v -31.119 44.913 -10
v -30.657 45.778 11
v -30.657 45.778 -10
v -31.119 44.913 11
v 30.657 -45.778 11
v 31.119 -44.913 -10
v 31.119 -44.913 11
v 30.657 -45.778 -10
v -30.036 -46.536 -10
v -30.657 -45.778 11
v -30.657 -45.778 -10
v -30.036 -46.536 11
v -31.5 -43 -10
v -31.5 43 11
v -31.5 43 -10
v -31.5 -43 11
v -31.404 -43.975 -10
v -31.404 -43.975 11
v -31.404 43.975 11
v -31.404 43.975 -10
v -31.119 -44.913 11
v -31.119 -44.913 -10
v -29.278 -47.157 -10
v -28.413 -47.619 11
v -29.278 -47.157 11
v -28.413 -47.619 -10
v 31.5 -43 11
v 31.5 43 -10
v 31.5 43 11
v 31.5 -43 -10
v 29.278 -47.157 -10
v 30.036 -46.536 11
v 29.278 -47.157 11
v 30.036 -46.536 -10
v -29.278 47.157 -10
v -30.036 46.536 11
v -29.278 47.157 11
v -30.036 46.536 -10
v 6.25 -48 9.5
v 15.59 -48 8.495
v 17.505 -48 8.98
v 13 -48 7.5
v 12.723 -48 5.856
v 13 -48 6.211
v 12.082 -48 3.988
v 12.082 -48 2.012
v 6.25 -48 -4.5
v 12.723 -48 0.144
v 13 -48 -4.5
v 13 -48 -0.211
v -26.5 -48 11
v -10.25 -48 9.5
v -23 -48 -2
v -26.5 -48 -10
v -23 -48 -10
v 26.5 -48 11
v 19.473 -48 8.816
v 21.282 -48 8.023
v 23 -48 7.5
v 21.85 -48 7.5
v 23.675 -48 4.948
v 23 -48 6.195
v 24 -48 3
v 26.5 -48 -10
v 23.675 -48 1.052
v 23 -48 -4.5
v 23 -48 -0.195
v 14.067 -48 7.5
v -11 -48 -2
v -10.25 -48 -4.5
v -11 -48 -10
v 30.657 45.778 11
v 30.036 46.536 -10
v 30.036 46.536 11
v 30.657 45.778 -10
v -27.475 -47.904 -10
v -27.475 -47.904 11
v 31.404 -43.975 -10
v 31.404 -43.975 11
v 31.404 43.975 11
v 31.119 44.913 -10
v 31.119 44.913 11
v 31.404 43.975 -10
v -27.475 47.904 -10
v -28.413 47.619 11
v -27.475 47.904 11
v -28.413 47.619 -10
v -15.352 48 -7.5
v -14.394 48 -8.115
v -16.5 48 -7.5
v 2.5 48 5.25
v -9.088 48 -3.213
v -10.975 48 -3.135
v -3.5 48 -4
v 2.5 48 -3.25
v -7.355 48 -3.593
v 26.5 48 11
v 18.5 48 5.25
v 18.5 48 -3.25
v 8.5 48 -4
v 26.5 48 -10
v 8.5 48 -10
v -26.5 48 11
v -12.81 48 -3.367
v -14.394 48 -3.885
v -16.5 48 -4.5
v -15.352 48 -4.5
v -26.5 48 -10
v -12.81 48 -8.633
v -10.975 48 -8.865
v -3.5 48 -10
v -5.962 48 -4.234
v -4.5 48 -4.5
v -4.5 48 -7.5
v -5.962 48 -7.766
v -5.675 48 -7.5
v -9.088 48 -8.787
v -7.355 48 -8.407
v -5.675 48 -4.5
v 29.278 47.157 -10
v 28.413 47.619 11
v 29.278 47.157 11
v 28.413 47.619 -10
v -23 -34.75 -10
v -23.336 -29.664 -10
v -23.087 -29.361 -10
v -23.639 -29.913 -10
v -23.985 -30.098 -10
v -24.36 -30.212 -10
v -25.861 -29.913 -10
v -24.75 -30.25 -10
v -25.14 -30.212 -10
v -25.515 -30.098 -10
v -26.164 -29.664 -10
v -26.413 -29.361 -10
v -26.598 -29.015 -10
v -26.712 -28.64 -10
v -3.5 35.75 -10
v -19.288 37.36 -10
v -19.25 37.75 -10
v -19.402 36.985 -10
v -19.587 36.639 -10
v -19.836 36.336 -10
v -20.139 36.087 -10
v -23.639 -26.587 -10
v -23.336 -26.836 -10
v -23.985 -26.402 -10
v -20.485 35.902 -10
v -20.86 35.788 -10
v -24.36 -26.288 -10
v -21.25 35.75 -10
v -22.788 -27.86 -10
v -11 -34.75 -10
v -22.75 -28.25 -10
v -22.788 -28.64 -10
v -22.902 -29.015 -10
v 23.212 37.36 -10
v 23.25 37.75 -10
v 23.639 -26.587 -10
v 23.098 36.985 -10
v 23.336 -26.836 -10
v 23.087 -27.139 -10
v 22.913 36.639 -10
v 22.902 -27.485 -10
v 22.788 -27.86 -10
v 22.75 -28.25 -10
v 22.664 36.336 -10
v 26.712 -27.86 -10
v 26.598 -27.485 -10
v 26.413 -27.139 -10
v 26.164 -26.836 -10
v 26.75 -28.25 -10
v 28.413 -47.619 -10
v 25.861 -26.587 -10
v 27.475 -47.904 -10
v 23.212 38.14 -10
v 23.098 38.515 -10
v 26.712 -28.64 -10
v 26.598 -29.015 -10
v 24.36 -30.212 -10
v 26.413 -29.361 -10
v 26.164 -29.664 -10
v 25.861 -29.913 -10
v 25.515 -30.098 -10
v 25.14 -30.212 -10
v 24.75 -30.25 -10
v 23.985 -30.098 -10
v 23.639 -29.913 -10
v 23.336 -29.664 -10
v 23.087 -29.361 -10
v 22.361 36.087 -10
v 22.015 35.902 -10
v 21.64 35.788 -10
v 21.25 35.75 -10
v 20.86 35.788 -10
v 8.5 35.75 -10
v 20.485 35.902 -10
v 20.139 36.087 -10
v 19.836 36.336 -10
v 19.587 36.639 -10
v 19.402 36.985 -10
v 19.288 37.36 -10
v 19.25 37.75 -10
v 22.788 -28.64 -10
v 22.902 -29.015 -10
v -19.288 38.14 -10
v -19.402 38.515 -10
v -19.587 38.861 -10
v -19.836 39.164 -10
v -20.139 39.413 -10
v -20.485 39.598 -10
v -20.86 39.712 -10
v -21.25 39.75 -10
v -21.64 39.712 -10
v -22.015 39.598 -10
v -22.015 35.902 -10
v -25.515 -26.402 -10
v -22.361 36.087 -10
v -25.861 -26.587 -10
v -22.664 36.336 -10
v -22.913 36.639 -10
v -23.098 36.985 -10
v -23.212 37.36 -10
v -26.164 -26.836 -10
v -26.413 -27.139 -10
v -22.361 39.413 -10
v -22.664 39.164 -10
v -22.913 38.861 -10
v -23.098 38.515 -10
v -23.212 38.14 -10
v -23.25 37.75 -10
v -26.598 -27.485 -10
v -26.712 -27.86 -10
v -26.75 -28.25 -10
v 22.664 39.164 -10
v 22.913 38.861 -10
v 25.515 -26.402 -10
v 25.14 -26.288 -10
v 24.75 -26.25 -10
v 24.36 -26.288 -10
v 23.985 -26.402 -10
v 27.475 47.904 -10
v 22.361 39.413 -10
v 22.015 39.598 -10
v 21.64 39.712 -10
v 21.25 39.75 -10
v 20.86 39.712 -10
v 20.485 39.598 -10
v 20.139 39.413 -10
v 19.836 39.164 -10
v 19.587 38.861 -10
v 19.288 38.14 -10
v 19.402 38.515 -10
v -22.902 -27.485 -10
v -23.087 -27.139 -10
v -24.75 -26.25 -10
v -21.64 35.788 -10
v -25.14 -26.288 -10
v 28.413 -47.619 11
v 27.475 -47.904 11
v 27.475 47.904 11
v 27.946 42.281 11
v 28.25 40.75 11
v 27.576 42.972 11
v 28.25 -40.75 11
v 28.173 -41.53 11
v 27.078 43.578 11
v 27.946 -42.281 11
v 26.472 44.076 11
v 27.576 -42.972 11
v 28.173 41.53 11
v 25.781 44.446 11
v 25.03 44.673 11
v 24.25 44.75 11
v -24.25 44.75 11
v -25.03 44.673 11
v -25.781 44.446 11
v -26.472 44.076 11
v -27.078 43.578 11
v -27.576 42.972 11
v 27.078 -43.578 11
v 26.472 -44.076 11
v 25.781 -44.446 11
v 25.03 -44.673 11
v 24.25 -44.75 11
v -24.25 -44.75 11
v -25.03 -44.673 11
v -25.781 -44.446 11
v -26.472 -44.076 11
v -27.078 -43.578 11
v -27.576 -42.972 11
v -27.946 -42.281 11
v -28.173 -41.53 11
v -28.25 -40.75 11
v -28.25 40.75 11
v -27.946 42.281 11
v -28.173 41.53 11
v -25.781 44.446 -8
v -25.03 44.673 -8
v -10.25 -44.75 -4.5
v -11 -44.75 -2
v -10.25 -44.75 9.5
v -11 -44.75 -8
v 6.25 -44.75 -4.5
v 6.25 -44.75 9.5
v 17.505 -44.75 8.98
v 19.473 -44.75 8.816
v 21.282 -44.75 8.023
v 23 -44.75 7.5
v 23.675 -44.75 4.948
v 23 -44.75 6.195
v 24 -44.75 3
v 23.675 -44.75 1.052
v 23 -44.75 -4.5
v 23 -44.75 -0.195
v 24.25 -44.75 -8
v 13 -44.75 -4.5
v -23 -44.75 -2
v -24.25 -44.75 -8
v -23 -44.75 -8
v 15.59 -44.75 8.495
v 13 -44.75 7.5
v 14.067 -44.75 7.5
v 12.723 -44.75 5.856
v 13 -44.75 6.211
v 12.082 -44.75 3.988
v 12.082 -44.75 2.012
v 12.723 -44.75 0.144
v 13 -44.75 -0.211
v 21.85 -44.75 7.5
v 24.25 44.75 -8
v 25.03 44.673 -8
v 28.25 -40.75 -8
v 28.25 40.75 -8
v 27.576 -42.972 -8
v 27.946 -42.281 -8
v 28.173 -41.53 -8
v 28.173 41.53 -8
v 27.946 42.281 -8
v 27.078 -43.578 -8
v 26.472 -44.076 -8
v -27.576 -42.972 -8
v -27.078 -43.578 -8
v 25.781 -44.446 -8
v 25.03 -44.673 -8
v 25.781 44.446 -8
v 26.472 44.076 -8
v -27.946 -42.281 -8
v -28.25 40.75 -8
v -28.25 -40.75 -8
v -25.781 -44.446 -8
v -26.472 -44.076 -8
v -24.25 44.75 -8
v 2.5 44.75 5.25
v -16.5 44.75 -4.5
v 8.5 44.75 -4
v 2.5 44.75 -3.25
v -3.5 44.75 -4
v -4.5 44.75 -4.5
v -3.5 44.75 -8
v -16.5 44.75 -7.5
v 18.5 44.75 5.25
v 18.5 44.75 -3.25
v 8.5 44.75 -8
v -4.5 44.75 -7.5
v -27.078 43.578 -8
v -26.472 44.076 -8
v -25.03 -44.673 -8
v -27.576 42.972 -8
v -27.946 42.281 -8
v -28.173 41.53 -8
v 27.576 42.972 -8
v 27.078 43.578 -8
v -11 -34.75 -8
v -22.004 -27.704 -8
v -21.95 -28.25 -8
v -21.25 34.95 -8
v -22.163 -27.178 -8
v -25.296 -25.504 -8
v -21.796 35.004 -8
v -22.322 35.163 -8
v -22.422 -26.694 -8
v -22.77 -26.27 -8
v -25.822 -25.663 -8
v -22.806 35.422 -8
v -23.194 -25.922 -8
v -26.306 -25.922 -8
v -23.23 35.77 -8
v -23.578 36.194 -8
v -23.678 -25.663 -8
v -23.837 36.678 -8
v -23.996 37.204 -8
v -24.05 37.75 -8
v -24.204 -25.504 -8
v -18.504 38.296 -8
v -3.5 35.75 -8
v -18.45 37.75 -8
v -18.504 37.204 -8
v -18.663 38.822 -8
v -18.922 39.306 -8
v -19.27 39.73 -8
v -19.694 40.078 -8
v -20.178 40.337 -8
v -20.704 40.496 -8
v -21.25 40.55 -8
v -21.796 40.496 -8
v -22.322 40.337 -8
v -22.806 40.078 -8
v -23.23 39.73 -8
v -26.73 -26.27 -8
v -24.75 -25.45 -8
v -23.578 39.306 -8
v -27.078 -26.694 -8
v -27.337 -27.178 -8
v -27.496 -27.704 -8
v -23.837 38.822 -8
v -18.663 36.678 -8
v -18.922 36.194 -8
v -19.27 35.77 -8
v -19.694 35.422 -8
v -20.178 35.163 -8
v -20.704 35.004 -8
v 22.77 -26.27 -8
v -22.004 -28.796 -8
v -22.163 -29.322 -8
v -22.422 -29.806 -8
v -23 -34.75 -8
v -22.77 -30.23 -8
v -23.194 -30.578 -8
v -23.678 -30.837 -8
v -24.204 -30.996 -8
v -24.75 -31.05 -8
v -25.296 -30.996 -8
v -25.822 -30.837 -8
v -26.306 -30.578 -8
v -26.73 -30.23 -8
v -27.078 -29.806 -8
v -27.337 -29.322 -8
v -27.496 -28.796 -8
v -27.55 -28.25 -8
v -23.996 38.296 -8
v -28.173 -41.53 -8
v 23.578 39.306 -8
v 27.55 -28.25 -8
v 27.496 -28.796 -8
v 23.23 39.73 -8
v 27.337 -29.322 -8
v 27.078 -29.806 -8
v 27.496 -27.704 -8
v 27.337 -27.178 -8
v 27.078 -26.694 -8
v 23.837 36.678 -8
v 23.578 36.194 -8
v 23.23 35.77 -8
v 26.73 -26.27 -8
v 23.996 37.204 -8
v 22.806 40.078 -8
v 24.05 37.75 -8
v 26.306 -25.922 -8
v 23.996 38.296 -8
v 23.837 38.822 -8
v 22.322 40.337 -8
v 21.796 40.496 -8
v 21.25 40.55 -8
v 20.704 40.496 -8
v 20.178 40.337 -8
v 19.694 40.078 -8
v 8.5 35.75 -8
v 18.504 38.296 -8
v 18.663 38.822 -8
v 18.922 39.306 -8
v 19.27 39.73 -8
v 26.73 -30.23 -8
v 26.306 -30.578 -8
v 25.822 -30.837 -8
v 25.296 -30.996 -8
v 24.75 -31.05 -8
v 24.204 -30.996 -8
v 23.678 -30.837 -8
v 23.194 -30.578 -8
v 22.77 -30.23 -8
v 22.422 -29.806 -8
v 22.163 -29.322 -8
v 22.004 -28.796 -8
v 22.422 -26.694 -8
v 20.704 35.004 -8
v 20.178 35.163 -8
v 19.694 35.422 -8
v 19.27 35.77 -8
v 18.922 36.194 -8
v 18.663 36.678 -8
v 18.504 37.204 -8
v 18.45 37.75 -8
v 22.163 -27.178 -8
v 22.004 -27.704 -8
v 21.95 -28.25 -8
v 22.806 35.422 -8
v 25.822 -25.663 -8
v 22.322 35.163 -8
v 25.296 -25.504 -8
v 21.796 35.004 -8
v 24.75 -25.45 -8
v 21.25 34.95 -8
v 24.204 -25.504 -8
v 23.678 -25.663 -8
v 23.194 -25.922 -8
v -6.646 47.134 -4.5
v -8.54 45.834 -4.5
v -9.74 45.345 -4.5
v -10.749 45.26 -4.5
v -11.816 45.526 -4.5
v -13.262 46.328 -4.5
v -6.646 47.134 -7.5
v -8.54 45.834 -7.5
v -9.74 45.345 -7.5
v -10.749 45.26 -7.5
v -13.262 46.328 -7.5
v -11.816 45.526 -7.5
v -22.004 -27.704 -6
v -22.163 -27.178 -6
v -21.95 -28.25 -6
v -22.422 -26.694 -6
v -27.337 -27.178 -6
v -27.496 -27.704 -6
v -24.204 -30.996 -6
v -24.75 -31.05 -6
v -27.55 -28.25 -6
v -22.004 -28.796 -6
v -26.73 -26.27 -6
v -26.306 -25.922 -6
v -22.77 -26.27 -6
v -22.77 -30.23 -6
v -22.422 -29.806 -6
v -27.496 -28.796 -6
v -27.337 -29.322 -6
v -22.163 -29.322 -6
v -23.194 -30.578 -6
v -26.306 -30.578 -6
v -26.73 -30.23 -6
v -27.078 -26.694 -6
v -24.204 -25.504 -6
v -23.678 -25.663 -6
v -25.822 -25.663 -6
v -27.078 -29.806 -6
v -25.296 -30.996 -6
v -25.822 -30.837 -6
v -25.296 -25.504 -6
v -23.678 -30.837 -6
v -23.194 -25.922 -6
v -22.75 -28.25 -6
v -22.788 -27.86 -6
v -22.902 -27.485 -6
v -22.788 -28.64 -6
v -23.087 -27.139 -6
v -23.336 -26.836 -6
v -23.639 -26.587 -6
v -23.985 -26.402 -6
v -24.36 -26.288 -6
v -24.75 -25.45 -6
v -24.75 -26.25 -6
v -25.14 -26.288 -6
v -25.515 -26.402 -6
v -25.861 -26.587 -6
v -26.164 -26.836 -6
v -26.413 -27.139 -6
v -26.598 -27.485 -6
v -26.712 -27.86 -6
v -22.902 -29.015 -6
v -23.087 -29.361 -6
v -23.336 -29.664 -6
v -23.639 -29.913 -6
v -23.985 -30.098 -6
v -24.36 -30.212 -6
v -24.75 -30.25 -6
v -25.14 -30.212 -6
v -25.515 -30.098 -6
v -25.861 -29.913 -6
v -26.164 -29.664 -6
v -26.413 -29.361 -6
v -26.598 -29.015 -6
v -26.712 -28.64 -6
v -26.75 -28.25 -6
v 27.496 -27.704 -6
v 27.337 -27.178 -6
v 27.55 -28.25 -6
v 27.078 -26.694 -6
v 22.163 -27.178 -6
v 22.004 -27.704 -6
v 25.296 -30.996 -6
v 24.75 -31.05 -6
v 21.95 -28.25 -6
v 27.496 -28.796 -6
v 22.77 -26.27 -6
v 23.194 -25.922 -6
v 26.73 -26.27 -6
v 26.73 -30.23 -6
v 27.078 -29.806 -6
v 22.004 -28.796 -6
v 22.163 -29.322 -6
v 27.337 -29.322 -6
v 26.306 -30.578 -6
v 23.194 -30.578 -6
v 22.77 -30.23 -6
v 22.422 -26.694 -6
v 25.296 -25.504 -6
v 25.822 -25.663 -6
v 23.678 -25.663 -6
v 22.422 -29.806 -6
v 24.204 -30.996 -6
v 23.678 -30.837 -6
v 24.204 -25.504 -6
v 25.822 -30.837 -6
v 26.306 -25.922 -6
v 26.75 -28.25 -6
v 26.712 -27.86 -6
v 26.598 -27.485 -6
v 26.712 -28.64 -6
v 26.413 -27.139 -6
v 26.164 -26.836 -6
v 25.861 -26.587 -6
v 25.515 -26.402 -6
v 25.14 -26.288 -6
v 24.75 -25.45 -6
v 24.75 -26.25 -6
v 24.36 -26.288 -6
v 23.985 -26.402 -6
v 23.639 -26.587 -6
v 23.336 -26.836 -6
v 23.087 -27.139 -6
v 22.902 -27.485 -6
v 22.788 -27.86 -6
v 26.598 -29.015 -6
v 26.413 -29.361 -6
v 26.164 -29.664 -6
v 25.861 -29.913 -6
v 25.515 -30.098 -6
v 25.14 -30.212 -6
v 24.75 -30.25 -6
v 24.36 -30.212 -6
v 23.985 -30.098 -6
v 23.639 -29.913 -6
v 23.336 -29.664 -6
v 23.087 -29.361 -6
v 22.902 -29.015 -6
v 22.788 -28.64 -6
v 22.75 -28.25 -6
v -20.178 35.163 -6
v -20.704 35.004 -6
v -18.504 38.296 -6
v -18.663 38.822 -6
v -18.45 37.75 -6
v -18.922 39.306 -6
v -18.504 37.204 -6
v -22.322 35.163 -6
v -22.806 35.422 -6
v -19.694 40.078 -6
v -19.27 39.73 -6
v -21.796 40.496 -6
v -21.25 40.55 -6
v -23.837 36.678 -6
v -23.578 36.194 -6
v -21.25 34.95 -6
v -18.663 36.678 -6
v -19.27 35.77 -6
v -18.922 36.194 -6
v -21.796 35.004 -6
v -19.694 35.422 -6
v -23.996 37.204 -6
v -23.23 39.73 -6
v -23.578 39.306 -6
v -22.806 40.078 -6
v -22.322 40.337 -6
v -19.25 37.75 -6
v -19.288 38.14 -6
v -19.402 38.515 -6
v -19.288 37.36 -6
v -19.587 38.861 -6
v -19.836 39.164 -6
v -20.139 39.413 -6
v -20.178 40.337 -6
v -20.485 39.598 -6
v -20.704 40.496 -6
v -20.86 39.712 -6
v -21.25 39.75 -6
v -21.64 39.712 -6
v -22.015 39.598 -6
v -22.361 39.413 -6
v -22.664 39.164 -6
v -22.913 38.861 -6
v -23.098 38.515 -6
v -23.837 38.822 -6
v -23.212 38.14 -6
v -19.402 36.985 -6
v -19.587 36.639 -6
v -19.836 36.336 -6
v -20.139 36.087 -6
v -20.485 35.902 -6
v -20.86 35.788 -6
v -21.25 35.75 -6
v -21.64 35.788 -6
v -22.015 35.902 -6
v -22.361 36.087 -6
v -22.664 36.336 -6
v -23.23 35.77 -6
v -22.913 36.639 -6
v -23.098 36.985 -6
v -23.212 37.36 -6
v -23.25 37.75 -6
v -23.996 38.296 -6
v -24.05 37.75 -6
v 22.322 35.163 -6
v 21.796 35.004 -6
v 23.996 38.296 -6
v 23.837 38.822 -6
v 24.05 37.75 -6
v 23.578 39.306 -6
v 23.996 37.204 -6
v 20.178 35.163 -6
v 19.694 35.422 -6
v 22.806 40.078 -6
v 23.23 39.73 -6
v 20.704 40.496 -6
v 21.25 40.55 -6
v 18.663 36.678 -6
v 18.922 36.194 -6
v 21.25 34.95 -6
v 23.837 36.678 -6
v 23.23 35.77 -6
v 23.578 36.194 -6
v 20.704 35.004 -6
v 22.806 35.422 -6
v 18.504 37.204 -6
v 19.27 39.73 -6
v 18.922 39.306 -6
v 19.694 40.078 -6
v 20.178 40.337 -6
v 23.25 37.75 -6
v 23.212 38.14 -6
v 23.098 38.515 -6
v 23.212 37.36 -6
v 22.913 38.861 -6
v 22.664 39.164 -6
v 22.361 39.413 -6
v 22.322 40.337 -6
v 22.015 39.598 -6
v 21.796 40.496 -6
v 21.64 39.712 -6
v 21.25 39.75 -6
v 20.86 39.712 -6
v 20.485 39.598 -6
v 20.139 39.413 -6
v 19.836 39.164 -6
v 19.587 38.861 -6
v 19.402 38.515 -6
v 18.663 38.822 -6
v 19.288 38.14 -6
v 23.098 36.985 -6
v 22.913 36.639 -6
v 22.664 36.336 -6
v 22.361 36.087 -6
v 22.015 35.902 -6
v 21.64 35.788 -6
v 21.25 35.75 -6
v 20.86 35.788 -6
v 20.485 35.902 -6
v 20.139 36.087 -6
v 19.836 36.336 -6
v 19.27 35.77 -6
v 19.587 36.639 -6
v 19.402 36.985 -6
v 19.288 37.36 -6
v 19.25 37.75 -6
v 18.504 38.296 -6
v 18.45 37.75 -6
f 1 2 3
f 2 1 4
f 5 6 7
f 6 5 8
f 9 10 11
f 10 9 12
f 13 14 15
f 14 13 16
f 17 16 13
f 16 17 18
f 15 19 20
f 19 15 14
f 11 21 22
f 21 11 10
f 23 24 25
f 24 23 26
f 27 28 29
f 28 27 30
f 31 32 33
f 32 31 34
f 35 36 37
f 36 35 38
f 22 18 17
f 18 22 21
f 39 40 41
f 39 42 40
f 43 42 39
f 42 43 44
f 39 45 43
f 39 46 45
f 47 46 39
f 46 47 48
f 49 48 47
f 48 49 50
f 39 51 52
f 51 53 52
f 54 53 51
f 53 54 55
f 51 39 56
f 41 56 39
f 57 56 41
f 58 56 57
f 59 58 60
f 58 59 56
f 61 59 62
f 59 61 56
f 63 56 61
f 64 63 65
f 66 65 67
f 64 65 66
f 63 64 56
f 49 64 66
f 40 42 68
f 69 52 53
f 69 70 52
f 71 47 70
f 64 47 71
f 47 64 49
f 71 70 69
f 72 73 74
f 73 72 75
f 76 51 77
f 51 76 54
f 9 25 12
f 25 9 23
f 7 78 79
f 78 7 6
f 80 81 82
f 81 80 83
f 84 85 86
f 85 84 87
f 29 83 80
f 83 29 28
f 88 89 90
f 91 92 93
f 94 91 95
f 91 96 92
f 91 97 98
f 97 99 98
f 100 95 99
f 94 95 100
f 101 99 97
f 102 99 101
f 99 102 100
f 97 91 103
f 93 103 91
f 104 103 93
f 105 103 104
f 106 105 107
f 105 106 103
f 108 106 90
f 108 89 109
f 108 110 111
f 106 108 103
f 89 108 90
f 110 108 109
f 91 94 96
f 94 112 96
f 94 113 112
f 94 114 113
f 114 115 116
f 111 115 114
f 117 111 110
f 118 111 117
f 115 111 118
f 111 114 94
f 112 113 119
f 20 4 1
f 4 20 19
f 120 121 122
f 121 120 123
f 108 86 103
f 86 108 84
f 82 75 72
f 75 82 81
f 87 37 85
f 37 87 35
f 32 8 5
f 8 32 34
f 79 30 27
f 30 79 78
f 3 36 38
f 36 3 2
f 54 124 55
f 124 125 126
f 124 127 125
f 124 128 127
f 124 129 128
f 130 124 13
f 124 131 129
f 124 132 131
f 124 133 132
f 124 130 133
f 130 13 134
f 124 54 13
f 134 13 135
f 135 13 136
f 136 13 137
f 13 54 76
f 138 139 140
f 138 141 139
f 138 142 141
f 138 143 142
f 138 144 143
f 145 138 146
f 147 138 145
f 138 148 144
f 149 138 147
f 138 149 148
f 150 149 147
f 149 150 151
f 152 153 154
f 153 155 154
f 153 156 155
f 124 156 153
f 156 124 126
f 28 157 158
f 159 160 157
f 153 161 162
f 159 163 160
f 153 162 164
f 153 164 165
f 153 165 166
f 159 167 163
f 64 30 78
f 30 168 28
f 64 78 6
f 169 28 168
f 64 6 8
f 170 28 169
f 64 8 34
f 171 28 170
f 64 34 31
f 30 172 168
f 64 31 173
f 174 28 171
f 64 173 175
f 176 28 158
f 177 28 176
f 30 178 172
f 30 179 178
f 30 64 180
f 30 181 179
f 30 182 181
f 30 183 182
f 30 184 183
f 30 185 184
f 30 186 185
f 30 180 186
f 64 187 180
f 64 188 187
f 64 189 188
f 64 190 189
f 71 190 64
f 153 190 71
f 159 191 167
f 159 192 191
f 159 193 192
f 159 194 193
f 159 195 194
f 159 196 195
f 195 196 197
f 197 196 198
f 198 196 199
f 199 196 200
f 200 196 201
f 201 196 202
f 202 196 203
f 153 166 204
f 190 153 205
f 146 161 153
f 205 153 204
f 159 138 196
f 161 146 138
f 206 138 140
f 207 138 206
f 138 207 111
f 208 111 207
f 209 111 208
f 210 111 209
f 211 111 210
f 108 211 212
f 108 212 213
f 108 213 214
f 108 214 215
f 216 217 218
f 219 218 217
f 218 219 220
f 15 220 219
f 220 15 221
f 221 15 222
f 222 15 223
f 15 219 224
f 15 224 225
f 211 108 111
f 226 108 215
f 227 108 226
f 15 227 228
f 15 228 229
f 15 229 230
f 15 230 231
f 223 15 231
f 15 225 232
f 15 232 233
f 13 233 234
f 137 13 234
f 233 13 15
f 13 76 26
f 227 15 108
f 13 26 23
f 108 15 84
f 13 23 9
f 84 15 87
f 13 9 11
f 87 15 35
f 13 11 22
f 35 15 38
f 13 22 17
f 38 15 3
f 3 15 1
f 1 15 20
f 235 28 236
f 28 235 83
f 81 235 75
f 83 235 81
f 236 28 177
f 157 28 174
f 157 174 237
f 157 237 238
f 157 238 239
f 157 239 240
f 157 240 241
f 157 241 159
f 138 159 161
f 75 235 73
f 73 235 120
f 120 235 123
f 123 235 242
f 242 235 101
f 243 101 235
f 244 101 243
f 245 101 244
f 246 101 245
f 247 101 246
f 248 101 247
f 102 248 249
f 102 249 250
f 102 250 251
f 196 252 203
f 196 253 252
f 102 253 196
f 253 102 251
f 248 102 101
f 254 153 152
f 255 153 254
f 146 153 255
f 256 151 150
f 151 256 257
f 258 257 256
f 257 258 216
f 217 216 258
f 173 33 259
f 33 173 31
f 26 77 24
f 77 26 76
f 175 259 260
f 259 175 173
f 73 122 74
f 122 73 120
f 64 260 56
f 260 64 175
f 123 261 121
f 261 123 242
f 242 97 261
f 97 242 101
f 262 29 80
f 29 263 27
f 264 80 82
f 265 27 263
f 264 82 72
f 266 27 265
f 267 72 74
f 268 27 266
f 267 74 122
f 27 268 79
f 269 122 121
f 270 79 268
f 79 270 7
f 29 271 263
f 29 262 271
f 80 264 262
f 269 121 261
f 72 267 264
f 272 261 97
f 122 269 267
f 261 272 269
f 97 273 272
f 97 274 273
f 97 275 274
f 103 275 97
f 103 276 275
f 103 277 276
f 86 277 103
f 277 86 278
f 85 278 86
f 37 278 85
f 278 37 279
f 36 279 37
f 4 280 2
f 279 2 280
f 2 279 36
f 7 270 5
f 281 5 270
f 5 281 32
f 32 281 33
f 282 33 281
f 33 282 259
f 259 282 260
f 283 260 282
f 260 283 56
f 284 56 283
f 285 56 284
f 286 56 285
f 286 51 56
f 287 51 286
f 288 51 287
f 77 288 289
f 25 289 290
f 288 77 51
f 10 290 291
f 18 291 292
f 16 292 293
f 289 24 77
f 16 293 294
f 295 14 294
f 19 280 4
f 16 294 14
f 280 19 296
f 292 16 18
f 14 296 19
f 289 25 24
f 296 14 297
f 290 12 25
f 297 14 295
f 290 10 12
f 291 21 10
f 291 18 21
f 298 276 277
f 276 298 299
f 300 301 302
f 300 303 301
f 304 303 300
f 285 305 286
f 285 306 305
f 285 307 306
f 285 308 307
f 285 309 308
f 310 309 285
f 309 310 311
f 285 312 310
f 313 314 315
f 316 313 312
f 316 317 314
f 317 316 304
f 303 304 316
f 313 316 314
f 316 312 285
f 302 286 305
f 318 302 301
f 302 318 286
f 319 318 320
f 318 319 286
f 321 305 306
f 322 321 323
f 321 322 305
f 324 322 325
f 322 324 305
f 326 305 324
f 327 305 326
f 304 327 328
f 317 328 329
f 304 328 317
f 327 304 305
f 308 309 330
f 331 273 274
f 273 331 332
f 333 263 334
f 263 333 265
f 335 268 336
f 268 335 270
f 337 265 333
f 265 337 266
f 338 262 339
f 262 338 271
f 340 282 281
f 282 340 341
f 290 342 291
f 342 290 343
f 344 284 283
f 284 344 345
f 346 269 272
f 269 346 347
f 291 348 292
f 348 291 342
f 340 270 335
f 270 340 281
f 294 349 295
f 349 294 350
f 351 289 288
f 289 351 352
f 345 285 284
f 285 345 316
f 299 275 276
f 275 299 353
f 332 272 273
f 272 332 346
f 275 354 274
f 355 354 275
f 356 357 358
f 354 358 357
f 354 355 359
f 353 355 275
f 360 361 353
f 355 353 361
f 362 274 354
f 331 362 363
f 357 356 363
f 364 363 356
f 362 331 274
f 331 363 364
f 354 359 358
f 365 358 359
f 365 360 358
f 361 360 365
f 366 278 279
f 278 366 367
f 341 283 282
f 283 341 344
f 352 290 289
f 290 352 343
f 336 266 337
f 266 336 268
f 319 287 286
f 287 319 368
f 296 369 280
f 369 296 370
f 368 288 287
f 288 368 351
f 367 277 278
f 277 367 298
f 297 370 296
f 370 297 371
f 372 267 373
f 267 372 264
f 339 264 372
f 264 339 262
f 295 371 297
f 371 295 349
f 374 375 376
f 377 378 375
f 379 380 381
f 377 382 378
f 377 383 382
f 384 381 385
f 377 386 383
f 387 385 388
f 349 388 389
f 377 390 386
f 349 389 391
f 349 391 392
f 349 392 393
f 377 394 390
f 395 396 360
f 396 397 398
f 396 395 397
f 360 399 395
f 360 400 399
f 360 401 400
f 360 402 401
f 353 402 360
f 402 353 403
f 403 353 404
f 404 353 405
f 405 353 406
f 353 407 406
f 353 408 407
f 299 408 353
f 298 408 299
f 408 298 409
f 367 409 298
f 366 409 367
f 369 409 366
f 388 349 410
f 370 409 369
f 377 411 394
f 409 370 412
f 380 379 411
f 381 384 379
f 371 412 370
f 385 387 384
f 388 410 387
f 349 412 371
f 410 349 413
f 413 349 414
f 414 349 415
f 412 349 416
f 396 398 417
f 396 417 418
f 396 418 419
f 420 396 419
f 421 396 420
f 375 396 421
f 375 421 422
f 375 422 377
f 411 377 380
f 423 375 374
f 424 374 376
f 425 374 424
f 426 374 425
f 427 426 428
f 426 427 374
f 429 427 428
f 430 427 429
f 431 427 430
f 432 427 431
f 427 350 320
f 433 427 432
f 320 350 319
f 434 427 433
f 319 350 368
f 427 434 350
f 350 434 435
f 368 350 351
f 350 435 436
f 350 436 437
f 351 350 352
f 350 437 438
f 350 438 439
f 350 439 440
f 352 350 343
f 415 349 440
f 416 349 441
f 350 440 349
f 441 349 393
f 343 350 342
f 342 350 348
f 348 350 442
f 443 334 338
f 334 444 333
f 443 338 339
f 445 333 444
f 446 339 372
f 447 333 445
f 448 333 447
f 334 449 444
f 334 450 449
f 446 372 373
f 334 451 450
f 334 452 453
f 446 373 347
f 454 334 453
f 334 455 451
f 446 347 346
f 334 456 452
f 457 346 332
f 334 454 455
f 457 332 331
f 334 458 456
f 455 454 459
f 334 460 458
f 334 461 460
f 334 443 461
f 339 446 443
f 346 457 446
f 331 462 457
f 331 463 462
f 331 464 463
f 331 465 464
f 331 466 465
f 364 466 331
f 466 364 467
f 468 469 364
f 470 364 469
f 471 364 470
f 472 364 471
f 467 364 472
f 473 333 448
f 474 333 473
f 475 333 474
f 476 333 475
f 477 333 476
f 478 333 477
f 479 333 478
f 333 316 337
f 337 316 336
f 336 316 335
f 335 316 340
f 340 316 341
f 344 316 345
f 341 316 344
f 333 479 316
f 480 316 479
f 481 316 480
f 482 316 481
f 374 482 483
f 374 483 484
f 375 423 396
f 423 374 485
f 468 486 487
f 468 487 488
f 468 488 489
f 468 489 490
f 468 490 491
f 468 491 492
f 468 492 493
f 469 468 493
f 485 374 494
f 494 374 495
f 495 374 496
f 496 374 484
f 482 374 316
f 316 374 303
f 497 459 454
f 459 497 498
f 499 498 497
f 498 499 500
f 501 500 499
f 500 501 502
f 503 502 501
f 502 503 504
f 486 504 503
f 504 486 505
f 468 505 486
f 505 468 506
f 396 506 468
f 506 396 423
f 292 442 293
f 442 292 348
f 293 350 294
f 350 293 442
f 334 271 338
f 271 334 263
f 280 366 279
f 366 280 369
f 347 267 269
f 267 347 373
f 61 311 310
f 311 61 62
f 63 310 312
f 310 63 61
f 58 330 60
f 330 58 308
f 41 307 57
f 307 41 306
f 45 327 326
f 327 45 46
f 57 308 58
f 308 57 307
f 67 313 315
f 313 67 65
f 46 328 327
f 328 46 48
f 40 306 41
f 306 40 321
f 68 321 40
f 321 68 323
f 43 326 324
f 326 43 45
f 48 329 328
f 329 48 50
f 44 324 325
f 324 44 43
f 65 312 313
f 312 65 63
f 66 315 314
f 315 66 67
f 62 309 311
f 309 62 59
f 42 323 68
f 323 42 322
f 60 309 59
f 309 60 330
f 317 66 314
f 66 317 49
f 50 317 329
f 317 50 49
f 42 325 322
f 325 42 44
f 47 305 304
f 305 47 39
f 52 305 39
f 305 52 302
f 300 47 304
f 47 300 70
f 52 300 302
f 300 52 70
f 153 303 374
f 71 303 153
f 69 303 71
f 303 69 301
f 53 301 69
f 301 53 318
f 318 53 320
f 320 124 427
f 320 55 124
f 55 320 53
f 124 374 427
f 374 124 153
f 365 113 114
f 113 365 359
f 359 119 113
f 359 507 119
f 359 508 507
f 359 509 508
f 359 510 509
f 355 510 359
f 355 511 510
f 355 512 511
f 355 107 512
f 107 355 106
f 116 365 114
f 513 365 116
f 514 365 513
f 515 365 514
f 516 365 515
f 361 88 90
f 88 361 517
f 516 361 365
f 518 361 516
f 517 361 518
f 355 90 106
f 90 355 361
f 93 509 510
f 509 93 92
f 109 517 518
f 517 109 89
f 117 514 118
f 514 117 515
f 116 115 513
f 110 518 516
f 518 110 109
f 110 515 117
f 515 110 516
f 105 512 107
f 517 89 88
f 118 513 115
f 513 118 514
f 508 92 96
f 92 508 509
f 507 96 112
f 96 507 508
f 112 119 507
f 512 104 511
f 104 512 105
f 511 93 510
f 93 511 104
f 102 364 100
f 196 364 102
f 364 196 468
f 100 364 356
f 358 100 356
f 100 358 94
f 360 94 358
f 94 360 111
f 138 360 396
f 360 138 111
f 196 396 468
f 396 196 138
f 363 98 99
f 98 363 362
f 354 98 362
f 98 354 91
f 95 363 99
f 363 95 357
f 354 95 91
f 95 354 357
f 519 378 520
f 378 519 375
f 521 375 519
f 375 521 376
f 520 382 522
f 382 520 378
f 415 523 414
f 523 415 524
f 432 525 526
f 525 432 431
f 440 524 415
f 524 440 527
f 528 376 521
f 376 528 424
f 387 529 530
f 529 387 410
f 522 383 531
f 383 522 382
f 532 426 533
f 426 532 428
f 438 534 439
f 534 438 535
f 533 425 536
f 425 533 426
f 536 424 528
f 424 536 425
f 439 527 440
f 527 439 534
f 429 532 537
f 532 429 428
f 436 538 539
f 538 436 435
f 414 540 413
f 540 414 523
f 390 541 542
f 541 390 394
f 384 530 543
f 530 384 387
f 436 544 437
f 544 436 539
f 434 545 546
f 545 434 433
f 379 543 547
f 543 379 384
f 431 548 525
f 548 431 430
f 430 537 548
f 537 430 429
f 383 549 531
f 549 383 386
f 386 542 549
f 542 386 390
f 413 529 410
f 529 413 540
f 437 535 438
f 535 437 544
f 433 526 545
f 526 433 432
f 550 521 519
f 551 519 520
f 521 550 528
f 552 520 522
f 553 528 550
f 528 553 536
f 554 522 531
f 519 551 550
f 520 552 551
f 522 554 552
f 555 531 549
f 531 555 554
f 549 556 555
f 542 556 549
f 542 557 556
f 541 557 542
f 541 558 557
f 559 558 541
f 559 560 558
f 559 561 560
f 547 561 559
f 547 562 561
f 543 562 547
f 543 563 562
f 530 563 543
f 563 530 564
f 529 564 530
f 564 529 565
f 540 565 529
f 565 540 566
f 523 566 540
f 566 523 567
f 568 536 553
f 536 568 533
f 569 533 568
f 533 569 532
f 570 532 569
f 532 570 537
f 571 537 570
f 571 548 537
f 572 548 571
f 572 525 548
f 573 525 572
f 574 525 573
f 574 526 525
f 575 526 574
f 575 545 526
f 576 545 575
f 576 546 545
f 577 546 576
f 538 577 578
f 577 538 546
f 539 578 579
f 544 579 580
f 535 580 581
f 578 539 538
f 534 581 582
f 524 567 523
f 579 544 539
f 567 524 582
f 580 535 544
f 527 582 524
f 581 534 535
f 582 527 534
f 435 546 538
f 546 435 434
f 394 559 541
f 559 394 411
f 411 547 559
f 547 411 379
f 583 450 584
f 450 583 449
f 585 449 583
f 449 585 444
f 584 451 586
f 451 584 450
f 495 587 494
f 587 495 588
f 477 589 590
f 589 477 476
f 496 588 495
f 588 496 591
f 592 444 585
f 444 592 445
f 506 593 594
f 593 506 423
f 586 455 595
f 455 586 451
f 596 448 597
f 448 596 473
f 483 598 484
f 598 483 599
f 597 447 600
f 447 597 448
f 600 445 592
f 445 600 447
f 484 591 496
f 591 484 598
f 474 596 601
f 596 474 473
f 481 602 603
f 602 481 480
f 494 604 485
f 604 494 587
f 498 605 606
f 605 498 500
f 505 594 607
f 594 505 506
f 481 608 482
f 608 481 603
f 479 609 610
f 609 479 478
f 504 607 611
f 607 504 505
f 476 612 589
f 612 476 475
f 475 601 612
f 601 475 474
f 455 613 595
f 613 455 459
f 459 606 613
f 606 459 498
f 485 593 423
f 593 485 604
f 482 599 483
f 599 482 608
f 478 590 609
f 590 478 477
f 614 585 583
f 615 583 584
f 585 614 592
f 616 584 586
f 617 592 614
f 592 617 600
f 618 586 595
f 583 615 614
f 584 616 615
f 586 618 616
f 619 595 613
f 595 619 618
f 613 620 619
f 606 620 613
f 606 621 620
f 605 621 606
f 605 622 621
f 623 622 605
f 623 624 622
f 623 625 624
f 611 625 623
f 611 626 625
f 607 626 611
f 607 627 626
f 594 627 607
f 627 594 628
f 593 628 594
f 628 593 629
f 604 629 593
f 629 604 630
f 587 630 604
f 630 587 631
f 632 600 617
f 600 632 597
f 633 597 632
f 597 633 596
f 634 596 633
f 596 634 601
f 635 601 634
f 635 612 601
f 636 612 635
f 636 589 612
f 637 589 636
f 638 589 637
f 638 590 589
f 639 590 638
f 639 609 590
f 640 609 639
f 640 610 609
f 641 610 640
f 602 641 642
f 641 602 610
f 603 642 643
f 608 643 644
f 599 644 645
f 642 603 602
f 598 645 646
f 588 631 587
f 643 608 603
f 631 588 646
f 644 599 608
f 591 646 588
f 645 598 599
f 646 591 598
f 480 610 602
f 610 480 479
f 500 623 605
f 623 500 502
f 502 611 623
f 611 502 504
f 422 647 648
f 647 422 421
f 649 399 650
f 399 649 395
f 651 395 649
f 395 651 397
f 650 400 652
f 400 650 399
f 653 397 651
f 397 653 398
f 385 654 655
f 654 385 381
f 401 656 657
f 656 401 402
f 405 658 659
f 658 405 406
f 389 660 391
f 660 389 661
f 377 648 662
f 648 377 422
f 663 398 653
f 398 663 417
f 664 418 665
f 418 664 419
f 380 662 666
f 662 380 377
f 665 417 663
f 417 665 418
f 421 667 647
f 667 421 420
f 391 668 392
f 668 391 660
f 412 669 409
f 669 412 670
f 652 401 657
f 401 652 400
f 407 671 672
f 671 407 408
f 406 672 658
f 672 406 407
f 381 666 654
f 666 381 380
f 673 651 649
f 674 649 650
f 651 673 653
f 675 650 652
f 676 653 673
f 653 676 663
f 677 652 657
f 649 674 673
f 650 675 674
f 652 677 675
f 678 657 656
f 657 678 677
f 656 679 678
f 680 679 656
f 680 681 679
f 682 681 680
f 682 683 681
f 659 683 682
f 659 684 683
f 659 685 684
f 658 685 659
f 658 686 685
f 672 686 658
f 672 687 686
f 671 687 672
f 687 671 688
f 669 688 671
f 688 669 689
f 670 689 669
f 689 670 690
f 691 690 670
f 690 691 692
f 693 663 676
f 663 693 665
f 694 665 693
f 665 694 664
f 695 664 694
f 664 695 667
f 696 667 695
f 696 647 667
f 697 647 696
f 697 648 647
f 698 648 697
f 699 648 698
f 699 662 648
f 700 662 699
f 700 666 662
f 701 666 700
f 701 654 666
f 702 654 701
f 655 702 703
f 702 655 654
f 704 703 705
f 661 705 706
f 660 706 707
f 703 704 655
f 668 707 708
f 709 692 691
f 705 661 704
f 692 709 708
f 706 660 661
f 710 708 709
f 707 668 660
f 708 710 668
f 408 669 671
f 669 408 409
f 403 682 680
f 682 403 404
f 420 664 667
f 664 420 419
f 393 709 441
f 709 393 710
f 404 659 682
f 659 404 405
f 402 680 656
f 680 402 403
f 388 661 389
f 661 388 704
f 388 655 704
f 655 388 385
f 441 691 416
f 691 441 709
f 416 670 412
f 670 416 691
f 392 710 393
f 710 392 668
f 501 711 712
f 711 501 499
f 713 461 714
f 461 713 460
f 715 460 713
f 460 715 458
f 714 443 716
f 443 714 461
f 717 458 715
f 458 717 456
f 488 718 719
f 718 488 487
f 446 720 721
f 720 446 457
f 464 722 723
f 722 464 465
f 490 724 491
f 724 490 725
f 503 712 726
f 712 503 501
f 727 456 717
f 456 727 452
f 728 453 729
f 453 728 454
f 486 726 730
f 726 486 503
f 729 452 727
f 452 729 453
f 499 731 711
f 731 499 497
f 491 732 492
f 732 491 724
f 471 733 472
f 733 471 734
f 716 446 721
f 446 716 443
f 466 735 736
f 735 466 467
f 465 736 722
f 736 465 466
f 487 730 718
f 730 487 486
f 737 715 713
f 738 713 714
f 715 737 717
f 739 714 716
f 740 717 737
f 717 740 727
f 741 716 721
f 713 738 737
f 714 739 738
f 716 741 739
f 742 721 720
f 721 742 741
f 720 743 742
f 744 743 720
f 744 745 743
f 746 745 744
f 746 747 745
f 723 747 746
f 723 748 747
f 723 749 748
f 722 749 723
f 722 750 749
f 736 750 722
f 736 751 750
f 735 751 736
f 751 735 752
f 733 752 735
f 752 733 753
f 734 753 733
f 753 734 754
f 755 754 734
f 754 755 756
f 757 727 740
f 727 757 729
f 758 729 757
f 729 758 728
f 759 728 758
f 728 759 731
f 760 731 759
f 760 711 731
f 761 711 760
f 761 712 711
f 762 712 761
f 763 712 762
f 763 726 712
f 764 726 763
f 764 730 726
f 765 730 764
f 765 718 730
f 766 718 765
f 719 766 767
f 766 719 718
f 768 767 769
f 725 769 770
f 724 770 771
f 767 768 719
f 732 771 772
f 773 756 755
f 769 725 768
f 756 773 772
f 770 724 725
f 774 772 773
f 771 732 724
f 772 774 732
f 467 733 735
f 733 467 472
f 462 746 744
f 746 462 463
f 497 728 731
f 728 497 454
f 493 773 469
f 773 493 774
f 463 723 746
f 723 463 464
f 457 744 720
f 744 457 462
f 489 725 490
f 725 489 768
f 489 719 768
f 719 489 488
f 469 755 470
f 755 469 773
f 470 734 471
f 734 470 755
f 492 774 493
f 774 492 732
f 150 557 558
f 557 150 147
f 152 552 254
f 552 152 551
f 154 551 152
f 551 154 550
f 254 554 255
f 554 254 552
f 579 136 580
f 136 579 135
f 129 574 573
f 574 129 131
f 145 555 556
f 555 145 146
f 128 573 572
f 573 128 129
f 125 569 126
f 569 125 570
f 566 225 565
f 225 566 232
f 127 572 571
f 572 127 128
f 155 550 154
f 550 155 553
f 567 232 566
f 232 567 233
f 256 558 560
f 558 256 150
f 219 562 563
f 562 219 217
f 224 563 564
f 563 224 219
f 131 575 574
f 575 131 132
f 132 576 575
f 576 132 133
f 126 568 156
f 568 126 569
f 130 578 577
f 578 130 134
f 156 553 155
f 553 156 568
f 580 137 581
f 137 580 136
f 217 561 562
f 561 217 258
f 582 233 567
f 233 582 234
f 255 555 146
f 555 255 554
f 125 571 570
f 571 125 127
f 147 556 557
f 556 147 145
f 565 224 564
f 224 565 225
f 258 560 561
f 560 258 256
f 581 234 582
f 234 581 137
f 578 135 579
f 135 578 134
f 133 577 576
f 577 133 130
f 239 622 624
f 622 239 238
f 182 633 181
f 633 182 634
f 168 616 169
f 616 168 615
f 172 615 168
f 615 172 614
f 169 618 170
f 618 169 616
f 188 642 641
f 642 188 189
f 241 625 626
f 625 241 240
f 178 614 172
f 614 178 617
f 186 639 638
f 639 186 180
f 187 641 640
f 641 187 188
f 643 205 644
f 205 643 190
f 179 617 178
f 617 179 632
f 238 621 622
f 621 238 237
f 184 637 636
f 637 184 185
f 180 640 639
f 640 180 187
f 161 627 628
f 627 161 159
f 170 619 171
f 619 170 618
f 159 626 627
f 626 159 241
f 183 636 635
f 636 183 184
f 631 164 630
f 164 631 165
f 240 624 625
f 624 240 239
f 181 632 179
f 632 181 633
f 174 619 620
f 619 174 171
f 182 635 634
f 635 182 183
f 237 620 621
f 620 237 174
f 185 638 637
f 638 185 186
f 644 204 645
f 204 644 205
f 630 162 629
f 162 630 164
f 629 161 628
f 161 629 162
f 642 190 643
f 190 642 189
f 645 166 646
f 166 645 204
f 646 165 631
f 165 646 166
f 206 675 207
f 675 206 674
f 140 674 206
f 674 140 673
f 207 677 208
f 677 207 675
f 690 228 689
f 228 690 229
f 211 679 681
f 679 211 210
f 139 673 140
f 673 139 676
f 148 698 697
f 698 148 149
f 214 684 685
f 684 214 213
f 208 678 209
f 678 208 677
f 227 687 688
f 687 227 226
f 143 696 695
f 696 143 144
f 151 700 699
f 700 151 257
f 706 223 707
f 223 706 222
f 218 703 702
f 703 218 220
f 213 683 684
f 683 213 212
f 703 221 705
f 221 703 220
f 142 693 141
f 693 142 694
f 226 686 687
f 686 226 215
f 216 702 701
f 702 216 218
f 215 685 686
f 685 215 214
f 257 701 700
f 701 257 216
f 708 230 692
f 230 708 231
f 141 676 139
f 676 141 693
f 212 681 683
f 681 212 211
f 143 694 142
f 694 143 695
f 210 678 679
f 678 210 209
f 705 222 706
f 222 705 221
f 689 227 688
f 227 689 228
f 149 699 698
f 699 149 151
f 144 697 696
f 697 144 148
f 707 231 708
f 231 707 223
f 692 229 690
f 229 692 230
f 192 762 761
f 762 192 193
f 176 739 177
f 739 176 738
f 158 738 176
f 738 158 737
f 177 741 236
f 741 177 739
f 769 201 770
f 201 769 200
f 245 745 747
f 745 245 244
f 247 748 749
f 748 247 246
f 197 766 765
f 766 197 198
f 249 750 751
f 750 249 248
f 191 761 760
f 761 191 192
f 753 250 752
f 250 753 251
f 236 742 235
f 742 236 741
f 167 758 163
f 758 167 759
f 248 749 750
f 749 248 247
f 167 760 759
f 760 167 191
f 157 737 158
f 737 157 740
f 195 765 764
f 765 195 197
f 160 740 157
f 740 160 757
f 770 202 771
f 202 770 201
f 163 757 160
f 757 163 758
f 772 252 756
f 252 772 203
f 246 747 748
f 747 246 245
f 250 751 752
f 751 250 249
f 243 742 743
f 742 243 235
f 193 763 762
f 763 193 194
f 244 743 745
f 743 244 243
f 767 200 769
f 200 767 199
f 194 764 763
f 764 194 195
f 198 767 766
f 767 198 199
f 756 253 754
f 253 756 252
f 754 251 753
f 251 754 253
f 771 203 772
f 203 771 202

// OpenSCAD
wall_thickness=6.5;
base_thickness=2.0;
bb_depth=20;
bb_width=56.5;
bb_height=89.5;
bb_curve_corner=10;

peg_pow_front=16.5;
peg_pow_side=3.5;

peg_sd_front=7;
peg_sd_side=7;

peg_outer_radius=2.8;
peg_inner_radius=2.0;

module RoundedBB(extra_width,extra_height,depth,curve=bb_curve_corner) {
  minkowski() {
		cube([bb_width-curve+extra_width,bb_height-curve+extra_height,depth],center=true);
		cylinder(r=curve/2, height=depth, $fn=32);
	}
}

module BeagleBox(curve=bb_curve_corner) {
	difference() {
		RoundedBB(wall_thickness, wall_thickness, bb_depth, curve);
		translate([0,0,base_thickness])
			RoundedBB(0, 0, bb_depth, curve-2);
	}	
}

difference() {
	union() {
		difference() {
			BeagleBox();

			translate([0,0,-bb_depth/2+9]) {
				// -- Bottom End --

				// Power connector
%				translate([18,-bb_height/2,2.5])
					cube([10,10,12],center=true);
				translate( [18,-45,4] )
					rotate( [90,0,0] )
					cylinder( r=6, h=9, center=true );
				translate([18,-bb_height/2,2.5])
					cube([10,10,12],center=true);
				// Ethernet port
				translate([-2,-bb_height/2,3.5])
					cube([16.5,10,14],center=true);

				// Mini USB (Underneath)
				// translate([-23,-bb_height/2-5,-16])     // protruding
				// translate([-23,-bb_height/2,-9+0.334])  // thin layer underneath
				//	cube([10,12,base_thickness-0.3333]);
				translate([-23,-bb_height/2-10,-10])
					cube([12,20,9]);
				// original mini USB, doesn't fit cable
%				translate([-22,-bb_height/2-10,-12])
					cube([10,20,8]);

				// -- Top End --

				// SD Card slot
				translate([-6.5-4,bb_height/2,-5.0])
					cube([12,10,3], center=true);
				// Original SD slot
%				translate([-6.5,bb_height/2,-5.5])
					cube([12,10,2], center=true);
				// thumb depression for inserting card
				translate([-6.5-4,bb_height/2+3.5,-5.0])
					scale( [1,1,0.5] )
					rotate( [90,0,0] )
					cylinder( r1=6, r2=0, h=6 );
				// HDMI port
				translate([-6.5+3.0,bb_height/2-9,-12.0])
					cube([12,20,9]);
				// USB port
				translate([10.5,bb_height/2,2.0])
					cube([16,10,8.5],center=true);
			}
		}

		// Pegs
		translate([0,0,-bb_depth/2+9]) {
			// Pegs on "power" end
			translate([-bb_width/2+peg_pow_side,-bb_height/2+peg_pow_front,-6])
				cylinder(r=peg_outer_radius,h=2,$fn=32,center=true);
			translate([bb_width/2-peg_pow_side,-bb_height/2+peg_pow_front,-6])
				cylinder(r=peg_outer_radius,h=2,$fn=32,center=true);

			// Pegs on "sd card" end
			translate([-bb_width/2+peg_sd_side,bb_height/2-peg_sd_front,-6])
				cylinder(r=peg_outer_radius,h=2,$fn=32,center=true);
			translate([bb_width/2-peg_sd_side,bb_height/2-peg_sd_front,-6])
				cylinder(r=peg_outer_radius,h=2,$fn=32,center=true);
		}
	}

	// Drill holes through pegs and floor
	translate([0,0,-bb_depth/2+9]) {
		// Pegs on "power" end
		translate([-bb_width/2+peg_pow_side,-bb_height/2+peg_pow_front,-5])
			cylinder(r=peg_inner_radius,h=10,$fn=32,center=true);
		translate([bb_width/2-peg_pow_side,-bb_height/2+peg_pow_front,-5])
			cylinder(r=peg_inner_radius,h=10,$fn=32,center=true);

		// Pegs on "sd card" end
		translate([-bb_width/2+peg_sd_side,bb_height/2-peg_sd_front,-5])
			cylinder(r=peg_inner_radius,h=10,$fn=32,center=true);
		translate([bb_width/2-peg_sd_side,bb_height/2-peg_sd_front,-5])
			cylinder(r=peg_inner_radius,h=10,$fn=32,center=true);
	}
}
